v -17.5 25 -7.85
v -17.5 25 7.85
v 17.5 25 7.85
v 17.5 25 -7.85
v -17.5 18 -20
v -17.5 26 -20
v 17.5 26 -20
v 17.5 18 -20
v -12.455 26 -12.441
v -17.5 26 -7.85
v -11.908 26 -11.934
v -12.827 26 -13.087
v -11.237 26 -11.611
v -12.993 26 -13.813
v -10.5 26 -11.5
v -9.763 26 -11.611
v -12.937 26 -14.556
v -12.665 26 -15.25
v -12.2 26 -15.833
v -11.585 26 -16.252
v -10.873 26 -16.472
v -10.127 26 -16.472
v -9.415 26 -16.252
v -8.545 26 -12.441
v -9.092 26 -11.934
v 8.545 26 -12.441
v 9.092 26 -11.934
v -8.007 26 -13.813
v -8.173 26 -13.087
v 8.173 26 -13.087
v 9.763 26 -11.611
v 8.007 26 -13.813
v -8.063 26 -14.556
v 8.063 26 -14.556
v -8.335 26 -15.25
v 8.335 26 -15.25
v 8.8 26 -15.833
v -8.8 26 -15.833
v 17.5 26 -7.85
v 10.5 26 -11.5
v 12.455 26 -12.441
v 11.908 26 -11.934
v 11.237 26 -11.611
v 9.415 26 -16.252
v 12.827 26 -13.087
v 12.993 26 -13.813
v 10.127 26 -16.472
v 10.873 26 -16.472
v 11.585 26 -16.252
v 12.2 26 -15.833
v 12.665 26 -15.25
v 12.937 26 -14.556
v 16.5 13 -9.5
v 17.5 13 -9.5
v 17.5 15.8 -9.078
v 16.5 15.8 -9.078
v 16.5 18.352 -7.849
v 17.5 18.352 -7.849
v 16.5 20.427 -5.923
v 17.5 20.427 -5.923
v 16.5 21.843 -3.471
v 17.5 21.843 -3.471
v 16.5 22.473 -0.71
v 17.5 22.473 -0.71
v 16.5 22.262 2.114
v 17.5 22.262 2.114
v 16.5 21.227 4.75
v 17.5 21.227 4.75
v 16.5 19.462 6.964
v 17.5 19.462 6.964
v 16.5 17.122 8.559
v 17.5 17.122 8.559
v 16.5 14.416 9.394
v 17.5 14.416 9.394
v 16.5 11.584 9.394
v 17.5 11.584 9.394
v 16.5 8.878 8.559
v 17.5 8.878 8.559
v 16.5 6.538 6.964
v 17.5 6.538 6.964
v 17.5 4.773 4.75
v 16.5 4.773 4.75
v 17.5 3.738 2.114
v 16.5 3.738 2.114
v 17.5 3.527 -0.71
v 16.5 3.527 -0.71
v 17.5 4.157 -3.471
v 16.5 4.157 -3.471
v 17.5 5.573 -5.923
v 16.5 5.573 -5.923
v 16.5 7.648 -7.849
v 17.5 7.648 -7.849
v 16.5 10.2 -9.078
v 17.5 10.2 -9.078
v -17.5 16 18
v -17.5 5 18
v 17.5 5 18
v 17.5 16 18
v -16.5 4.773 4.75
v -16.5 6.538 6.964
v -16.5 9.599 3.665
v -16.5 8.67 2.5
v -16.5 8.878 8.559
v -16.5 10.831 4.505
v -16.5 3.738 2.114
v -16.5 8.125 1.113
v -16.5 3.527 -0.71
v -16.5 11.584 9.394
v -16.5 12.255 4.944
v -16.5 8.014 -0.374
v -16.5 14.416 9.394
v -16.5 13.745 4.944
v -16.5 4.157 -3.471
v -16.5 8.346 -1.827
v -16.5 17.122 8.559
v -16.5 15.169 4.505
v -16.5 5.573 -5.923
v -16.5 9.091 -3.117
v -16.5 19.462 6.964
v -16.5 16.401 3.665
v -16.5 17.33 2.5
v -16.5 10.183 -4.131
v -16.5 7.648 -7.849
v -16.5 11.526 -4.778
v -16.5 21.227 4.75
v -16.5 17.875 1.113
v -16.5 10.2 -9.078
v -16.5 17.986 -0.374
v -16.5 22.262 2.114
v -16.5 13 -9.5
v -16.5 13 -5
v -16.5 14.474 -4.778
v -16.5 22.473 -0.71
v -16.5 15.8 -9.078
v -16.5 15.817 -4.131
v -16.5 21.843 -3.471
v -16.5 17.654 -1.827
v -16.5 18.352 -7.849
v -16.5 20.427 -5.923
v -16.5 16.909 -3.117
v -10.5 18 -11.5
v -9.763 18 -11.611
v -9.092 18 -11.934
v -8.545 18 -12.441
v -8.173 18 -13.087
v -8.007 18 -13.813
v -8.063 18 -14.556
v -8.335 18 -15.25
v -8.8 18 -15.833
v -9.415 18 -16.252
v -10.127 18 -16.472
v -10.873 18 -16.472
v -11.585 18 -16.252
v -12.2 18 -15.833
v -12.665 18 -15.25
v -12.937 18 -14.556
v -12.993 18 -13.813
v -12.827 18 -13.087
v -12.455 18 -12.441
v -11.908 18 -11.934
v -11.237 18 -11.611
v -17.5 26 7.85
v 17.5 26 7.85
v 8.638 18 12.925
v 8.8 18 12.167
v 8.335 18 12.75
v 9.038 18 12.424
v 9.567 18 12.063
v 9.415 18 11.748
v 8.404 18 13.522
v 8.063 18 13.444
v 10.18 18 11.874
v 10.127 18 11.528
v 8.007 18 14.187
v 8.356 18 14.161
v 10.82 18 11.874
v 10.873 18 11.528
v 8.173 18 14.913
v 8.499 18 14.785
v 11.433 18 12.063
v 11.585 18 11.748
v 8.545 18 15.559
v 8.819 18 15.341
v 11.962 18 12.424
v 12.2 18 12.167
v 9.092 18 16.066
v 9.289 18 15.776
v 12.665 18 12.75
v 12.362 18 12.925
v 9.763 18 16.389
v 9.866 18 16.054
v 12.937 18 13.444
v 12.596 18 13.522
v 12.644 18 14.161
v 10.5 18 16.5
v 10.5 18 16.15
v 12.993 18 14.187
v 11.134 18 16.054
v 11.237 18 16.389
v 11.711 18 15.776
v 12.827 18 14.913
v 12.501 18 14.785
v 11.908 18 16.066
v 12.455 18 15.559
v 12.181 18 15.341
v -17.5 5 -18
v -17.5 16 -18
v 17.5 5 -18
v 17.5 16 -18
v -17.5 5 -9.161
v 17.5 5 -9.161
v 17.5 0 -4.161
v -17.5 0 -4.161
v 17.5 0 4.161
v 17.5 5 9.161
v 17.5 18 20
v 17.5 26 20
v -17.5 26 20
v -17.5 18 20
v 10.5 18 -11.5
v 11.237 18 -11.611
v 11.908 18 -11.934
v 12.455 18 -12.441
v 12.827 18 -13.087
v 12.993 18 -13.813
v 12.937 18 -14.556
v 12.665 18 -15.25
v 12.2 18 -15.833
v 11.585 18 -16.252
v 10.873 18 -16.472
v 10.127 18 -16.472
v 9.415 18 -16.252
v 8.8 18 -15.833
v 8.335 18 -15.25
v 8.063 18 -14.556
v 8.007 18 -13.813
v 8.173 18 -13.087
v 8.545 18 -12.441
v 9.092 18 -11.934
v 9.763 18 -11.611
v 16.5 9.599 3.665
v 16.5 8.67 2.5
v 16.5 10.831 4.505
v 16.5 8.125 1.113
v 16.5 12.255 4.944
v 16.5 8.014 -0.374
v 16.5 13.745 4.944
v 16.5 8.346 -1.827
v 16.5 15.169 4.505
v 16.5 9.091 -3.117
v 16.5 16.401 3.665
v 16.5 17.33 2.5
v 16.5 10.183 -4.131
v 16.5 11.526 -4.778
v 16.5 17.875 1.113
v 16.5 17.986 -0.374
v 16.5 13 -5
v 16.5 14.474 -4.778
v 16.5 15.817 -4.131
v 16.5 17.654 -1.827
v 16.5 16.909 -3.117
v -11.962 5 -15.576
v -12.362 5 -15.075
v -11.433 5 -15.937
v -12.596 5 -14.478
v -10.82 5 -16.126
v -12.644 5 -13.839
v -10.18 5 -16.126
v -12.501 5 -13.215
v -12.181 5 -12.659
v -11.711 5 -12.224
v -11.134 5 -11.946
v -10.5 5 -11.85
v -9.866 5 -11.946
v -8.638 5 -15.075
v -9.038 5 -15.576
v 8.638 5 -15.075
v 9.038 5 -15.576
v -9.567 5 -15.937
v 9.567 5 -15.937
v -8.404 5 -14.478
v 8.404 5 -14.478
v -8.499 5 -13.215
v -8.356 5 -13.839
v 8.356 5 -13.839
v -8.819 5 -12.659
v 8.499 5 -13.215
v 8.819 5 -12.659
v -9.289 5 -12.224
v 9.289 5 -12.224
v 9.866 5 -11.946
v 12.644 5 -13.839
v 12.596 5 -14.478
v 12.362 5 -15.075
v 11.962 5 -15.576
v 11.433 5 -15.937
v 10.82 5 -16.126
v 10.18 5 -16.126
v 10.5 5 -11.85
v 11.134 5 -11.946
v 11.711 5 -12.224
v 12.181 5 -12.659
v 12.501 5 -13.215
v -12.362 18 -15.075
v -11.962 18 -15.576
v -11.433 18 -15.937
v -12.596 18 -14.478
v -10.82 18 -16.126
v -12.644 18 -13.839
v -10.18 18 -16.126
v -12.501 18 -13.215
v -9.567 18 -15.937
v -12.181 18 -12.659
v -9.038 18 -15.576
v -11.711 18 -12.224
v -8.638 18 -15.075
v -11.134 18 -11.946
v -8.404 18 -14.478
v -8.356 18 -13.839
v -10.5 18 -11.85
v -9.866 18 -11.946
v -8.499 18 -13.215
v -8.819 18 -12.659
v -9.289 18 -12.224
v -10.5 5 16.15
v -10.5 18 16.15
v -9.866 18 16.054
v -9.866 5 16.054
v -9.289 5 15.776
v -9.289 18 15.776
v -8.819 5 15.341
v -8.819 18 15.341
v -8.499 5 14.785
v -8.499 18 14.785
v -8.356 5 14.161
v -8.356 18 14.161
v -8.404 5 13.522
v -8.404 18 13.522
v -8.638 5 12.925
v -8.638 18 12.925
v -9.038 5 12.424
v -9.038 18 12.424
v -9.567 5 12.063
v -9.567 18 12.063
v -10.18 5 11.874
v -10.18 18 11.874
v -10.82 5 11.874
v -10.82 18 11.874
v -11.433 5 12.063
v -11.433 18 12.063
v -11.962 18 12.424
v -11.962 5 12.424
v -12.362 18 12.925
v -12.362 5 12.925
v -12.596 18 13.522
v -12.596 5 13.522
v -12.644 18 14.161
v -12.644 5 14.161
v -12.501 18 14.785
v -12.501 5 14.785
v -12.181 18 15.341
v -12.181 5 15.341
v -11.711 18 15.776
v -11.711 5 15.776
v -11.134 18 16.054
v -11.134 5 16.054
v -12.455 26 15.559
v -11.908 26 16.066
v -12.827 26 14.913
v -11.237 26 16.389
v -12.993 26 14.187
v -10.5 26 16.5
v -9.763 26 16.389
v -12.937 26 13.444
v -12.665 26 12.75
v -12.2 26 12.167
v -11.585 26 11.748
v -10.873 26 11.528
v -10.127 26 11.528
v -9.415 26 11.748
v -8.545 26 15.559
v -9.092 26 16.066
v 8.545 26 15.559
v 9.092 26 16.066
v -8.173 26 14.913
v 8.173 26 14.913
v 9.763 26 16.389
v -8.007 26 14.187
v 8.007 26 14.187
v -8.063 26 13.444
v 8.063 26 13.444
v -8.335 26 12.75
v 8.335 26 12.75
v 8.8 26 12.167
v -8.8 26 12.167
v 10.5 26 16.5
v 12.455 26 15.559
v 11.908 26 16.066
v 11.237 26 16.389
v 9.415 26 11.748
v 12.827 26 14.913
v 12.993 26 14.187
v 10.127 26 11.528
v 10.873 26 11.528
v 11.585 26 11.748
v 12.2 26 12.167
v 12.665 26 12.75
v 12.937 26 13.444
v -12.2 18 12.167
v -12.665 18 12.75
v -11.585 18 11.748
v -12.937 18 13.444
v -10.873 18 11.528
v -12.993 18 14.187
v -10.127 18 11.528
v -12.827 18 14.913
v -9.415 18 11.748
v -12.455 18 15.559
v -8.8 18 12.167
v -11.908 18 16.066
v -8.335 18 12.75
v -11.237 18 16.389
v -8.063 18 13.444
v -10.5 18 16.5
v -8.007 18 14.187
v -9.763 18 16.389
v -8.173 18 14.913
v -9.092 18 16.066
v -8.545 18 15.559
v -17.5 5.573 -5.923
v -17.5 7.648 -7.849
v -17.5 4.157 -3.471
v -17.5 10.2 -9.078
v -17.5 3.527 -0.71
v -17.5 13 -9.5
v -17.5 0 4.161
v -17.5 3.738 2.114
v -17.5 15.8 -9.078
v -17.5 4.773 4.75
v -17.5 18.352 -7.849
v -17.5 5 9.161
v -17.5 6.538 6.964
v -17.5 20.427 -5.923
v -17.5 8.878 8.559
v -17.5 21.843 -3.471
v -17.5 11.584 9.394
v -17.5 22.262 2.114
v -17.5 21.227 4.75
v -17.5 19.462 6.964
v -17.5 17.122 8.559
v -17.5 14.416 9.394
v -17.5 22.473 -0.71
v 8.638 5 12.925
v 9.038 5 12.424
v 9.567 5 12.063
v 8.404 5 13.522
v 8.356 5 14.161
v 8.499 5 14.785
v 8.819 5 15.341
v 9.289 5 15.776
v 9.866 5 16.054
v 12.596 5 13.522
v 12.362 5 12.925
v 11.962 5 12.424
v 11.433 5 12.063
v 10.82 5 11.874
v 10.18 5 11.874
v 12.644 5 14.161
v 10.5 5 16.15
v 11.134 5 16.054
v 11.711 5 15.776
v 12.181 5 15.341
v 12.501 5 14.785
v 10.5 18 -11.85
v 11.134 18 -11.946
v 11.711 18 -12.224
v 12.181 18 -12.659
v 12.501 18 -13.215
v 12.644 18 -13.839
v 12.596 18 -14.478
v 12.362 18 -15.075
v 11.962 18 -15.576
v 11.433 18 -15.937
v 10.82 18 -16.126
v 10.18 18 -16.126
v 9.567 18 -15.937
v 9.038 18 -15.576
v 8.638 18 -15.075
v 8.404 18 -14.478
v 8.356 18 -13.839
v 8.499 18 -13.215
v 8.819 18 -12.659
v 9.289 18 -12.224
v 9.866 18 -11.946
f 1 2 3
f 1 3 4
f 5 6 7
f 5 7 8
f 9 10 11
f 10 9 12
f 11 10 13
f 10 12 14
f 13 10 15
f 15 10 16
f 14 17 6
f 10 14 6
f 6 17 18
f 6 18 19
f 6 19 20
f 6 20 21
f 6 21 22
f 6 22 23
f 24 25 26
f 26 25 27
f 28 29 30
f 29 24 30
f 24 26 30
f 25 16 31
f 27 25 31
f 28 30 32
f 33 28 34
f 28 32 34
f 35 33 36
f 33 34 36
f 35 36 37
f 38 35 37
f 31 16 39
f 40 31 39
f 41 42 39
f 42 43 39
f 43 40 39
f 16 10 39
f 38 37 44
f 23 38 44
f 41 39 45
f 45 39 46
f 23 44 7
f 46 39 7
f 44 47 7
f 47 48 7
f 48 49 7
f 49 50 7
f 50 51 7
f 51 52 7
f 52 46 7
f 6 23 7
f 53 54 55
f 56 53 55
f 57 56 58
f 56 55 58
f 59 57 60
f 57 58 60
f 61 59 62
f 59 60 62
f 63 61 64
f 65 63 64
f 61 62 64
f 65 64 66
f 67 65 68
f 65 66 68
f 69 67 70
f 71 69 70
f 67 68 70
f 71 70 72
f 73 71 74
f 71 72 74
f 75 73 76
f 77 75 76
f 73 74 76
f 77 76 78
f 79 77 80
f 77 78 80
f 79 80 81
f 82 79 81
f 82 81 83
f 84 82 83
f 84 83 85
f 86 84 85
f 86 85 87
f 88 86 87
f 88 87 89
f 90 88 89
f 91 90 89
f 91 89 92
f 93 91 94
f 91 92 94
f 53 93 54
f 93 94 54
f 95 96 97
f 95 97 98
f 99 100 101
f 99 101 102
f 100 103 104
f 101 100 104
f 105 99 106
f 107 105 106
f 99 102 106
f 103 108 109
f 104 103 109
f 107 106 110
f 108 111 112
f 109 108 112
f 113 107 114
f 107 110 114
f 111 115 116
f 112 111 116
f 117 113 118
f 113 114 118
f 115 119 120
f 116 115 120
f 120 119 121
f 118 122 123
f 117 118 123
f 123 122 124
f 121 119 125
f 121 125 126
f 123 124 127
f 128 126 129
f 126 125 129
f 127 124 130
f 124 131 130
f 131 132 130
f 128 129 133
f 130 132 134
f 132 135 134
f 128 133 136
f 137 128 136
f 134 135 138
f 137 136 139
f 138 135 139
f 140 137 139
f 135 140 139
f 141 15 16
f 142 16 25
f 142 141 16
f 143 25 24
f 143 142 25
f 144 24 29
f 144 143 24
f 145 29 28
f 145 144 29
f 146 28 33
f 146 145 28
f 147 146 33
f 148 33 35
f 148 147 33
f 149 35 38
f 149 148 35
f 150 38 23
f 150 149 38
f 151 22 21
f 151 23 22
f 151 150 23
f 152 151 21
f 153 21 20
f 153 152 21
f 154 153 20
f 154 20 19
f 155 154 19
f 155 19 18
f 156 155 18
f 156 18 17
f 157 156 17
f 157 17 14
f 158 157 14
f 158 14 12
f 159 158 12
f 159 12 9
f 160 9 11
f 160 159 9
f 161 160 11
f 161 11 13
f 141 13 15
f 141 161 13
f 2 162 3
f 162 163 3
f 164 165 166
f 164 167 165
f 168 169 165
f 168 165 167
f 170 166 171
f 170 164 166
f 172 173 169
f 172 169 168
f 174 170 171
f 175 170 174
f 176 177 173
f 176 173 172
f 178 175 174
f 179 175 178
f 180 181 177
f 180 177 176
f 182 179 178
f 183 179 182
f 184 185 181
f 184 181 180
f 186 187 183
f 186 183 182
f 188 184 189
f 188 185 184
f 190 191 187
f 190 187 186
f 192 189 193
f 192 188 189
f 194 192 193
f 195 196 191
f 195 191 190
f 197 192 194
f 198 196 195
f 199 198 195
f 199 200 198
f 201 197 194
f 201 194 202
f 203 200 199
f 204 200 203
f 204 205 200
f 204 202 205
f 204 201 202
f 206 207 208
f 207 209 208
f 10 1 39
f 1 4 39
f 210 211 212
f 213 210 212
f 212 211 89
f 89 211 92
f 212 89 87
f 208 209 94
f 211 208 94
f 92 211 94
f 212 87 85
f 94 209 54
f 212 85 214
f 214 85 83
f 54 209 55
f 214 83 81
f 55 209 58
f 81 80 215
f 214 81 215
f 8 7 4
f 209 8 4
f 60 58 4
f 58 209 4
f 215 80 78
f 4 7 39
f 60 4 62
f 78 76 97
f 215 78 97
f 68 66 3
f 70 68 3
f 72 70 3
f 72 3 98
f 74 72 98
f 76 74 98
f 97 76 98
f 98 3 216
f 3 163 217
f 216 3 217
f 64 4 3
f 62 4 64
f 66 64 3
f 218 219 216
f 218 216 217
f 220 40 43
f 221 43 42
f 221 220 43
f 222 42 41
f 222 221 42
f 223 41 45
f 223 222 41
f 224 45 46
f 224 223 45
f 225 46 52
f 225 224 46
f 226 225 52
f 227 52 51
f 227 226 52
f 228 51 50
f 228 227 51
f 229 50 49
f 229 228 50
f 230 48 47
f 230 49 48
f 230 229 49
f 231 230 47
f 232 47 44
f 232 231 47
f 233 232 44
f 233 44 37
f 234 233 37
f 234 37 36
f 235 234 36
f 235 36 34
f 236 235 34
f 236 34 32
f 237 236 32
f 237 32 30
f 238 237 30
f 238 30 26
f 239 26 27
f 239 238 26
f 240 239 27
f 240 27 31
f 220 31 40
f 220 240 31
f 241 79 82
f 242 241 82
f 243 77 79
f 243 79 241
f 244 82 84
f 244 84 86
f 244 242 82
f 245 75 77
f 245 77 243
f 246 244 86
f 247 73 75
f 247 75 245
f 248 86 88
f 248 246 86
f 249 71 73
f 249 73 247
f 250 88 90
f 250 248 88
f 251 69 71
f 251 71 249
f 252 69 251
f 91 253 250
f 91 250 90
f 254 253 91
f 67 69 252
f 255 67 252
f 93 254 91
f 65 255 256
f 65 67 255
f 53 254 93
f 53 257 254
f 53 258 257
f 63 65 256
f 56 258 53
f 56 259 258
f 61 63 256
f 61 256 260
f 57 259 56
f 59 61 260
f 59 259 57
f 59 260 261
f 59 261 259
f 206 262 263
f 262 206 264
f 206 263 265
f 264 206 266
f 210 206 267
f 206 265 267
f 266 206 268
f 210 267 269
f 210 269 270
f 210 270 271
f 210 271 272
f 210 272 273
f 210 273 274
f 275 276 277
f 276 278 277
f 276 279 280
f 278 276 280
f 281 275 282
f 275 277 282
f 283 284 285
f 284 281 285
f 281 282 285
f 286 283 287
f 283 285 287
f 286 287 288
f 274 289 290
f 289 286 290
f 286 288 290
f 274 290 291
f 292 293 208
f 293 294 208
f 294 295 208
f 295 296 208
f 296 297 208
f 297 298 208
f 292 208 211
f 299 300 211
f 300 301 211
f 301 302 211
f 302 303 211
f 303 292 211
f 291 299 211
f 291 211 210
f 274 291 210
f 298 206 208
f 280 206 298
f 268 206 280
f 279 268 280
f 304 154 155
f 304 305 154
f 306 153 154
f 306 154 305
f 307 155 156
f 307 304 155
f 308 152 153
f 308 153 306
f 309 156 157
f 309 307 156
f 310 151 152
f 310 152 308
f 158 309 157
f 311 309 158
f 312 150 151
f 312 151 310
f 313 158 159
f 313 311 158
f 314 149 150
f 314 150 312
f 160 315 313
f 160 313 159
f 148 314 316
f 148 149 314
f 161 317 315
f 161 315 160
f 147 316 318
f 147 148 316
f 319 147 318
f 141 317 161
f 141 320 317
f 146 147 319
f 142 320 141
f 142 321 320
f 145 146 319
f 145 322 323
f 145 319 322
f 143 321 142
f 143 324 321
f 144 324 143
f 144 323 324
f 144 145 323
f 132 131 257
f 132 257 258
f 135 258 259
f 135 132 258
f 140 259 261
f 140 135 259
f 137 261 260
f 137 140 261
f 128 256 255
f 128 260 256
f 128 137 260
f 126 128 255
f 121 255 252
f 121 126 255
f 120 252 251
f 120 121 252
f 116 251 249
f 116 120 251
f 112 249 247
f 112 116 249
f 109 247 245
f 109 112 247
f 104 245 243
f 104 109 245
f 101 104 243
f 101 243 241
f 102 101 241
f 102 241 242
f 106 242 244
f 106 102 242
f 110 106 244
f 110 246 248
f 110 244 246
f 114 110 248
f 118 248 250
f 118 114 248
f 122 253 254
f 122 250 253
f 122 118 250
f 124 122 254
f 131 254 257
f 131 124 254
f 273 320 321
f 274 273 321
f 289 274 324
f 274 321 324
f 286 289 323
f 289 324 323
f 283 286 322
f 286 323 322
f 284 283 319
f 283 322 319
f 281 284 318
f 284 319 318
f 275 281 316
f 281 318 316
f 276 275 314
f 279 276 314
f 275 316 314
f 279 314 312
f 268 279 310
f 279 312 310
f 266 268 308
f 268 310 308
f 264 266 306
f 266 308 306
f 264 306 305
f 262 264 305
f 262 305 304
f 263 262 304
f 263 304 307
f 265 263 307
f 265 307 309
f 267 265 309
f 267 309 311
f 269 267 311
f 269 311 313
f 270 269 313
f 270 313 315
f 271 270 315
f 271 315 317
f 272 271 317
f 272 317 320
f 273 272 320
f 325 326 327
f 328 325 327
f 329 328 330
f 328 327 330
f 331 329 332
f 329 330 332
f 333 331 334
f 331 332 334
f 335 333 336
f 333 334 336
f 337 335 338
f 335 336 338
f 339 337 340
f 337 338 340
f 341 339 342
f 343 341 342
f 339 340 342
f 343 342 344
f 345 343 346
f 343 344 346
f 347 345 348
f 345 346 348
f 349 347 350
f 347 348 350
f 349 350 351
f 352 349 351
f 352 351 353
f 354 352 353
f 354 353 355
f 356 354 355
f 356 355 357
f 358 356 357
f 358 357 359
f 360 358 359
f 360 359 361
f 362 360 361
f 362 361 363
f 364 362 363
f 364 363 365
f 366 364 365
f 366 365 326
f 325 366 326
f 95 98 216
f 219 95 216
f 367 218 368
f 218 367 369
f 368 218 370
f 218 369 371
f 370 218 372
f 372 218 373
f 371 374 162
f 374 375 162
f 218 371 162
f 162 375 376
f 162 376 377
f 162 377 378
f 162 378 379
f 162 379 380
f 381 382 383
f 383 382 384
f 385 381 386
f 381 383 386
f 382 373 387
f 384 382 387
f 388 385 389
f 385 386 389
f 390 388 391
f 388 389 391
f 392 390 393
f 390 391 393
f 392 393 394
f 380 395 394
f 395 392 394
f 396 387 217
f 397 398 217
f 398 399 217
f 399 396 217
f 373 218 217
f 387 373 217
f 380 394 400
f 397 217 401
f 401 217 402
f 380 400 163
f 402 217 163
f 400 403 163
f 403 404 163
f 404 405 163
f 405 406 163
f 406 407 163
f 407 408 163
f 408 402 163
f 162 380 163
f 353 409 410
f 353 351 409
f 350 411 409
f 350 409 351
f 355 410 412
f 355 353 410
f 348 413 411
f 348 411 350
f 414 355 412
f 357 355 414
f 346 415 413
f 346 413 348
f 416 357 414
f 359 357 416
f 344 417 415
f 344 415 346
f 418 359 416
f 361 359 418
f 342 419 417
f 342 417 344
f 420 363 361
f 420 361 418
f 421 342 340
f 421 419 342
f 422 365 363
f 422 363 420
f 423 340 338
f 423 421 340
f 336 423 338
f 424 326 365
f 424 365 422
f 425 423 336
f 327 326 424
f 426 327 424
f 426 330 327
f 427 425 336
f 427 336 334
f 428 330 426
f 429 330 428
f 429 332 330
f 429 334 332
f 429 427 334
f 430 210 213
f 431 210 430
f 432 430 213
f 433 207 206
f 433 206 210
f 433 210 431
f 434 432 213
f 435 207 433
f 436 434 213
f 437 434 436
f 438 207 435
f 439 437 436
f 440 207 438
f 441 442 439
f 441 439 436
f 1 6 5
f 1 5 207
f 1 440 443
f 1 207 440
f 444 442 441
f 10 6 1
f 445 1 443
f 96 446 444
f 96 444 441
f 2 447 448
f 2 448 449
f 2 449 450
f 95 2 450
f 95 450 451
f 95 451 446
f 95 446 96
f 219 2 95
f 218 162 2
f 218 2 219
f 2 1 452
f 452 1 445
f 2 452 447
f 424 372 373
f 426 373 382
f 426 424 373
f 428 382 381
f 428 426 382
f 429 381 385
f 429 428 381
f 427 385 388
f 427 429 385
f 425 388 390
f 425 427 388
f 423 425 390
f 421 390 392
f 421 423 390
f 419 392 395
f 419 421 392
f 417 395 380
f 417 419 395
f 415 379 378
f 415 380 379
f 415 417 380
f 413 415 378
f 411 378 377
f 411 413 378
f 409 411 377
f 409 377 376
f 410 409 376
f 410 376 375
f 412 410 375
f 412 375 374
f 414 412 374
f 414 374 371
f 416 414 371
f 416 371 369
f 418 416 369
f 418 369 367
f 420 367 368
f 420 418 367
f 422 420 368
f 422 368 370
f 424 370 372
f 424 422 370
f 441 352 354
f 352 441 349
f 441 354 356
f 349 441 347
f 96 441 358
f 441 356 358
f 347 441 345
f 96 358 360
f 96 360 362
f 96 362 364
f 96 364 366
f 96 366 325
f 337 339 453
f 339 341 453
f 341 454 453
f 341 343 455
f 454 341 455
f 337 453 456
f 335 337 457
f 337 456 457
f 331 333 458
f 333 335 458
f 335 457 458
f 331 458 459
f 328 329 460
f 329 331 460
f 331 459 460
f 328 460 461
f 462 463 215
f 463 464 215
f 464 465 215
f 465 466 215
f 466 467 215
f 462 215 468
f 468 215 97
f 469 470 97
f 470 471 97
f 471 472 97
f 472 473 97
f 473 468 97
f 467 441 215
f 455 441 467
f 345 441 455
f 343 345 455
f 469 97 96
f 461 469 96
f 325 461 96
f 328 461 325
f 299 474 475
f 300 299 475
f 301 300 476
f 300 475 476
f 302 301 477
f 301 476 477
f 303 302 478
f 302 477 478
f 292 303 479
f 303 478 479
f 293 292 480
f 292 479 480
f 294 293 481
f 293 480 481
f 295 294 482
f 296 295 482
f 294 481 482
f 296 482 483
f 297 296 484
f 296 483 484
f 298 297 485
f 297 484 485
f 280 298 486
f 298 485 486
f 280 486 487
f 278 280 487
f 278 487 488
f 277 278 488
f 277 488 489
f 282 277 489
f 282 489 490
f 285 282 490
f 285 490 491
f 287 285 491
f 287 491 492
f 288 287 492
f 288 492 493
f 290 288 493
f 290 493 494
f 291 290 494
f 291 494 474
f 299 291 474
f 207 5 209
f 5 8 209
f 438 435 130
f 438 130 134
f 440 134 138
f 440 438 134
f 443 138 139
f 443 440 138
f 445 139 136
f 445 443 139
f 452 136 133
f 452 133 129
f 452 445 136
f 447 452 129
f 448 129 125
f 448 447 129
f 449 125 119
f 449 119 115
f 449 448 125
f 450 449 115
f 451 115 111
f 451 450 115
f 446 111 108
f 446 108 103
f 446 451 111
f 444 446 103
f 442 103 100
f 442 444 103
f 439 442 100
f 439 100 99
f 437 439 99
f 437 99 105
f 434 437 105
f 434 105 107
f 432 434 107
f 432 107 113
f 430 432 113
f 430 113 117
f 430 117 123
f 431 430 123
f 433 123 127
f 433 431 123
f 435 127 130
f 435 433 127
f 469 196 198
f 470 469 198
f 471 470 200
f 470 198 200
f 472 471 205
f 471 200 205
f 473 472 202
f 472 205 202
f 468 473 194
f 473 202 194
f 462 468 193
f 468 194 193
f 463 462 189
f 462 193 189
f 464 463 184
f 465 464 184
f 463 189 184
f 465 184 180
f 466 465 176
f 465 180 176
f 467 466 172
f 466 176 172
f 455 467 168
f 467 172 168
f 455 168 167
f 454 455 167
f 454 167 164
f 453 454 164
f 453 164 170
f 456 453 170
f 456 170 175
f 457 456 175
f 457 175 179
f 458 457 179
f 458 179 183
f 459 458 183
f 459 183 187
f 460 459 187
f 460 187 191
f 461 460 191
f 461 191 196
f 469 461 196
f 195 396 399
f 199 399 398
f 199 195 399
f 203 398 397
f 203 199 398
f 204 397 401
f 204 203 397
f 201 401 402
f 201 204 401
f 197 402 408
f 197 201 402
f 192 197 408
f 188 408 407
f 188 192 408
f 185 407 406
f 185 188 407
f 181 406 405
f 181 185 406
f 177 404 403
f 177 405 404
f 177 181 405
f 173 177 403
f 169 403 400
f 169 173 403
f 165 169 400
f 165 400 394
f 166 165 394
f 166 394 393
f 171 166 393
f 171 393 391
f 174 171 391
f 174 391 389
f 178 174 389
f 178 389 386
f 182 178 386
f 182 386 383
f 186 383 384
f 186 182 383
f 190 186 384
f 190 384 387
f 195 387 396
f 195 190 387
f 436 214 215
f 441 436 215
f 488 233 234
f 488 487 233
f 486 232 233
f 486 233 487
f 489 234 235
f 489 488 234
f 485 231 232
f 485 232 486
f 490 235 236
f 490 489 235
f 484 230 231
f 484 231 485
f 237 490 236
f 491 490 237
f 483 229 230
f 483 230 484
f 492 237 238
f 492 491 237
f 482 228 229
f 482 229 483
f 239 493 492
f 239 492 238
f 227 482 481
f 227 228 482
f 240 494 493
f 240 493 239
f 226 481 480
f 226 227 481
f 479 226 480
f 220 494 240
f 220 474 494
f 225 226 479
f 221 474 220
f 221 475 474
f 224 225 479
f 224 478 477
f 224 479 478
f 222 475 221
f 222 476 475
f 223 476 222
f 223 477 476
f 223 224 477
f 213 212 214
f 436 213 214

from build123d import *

# Parameters (mm, degrees)
SKETCH1_R           = 5
BOSS_EXTRUDE1_DEPTH = 17.5
SKETCH3_R           = 2.5
CUT_EXTRUDE1_DEPTH  = 16
SKETCH4_R           = 2.15
CUT_EXTRUDE2_DEPTH  = 26
SKETCH9_R           = 9.5
CUT_EXTRUDE5_DEPTH  = 1


with BuildPart() as part:
    # Sketch1 → Boss-Extrude1 (new, symmetric)
    with BuildSketch(Plane(origin=(0, 0, 0), x_dir=(0, 0, -1), z_dir=(1, 0, 0))):
        Polygon((-20, 26), (-7.85, 26), (-7.85, 25), (7.85, 25), (7.85, 26), (20, 26), (20, 18), (18, 16), (18, 5), (9.161099759, 5), (4.161099759, 0), (-4.161099759, 0), (-9.161099759, 5), (-18, 5), (-18, 16), (-20, 18), align=None)
        with Locations((0, 13)):
            Circle(SKETCH1_R, mode=Mode.SUBTRACT)
    extrude(amount=BOSS_EXTRUDE1_DEPTH, both=True)

    # Sketch3 → Cut-Extrude1 (cut)
    with BuildSketch(Plane(origin=(0, 18, 0), x_dir=(-1, 0, 0), z_dir=(0, 1, 0))):
        with Locations(Location((-10.5, 14, 0), (0, 0, 90))):
            Circle(SKETCH3_R)
        with Locations(Location((10.5, 14, 0), (0, 0, 90))):
            Circle(SKETCH3_R)
        with Locations(Location((-10.5, -14, 0), (0, 0, 90))):
            Circle(SKETCH3_R)
        with Locations(Location((10.5, -14, 0), (0, 0, 90))):
            Circle(SKETCH3_R)
    extrude(amount=CUT_EXTRUDE1_DEPTH, mode=Mode.SUBTRACT)

    # Sketch4 → Cut-Extrude2 (cut)
    with BuildSketch(Plane(origin=(0, 18, 0), x_dir=(-1, 0, 0), z_dir=(0, 1, 0))):
        with Locations(Location((-10.5, 14, 0), (0, 0, 90))):
            Circle(SKETCH4_R)
        with Locations(Location((10.5, 14, 0), (0, 0, 90))):
            Circle(SKETCH4_R)
        with Locations(Location((10.5, -14, 0), (0, 0, 90))):
            Circle(SKETCH4_R)
        with Locations(Location((-10.5, -14, 0), (0, 0, 90))):
            Circle(SKETCH4_R)
    extrude(amount=-CUT_EXTRUDE2_DEPTH, mode=Mode.SUBTRACT)

    # Sketch9 → Cut-Extrude5 (cut)
    with BuildSketch(Plane(origin=(17.5, 0, 0), x_dir=(0, 0, -1), z_dir=(1, 0, 0))):
        with Locations((0, 13)):
            Circle(SKETCH9_R)
    cut_extrude5 = extrude(amount=-CUT_EXTRUDE5_DEPTH, mode=Mode.SUBTRACT)

    # Mirror4: Cut-Extrude5 across plane
    add(cut_extrude5.mirror(Plane(origin=(0, 0, 0), x_dir=(0, 0, 1), z_dir=(1, 0, 0))), mode=Mode.SUBTRACT)


solid = part.part
